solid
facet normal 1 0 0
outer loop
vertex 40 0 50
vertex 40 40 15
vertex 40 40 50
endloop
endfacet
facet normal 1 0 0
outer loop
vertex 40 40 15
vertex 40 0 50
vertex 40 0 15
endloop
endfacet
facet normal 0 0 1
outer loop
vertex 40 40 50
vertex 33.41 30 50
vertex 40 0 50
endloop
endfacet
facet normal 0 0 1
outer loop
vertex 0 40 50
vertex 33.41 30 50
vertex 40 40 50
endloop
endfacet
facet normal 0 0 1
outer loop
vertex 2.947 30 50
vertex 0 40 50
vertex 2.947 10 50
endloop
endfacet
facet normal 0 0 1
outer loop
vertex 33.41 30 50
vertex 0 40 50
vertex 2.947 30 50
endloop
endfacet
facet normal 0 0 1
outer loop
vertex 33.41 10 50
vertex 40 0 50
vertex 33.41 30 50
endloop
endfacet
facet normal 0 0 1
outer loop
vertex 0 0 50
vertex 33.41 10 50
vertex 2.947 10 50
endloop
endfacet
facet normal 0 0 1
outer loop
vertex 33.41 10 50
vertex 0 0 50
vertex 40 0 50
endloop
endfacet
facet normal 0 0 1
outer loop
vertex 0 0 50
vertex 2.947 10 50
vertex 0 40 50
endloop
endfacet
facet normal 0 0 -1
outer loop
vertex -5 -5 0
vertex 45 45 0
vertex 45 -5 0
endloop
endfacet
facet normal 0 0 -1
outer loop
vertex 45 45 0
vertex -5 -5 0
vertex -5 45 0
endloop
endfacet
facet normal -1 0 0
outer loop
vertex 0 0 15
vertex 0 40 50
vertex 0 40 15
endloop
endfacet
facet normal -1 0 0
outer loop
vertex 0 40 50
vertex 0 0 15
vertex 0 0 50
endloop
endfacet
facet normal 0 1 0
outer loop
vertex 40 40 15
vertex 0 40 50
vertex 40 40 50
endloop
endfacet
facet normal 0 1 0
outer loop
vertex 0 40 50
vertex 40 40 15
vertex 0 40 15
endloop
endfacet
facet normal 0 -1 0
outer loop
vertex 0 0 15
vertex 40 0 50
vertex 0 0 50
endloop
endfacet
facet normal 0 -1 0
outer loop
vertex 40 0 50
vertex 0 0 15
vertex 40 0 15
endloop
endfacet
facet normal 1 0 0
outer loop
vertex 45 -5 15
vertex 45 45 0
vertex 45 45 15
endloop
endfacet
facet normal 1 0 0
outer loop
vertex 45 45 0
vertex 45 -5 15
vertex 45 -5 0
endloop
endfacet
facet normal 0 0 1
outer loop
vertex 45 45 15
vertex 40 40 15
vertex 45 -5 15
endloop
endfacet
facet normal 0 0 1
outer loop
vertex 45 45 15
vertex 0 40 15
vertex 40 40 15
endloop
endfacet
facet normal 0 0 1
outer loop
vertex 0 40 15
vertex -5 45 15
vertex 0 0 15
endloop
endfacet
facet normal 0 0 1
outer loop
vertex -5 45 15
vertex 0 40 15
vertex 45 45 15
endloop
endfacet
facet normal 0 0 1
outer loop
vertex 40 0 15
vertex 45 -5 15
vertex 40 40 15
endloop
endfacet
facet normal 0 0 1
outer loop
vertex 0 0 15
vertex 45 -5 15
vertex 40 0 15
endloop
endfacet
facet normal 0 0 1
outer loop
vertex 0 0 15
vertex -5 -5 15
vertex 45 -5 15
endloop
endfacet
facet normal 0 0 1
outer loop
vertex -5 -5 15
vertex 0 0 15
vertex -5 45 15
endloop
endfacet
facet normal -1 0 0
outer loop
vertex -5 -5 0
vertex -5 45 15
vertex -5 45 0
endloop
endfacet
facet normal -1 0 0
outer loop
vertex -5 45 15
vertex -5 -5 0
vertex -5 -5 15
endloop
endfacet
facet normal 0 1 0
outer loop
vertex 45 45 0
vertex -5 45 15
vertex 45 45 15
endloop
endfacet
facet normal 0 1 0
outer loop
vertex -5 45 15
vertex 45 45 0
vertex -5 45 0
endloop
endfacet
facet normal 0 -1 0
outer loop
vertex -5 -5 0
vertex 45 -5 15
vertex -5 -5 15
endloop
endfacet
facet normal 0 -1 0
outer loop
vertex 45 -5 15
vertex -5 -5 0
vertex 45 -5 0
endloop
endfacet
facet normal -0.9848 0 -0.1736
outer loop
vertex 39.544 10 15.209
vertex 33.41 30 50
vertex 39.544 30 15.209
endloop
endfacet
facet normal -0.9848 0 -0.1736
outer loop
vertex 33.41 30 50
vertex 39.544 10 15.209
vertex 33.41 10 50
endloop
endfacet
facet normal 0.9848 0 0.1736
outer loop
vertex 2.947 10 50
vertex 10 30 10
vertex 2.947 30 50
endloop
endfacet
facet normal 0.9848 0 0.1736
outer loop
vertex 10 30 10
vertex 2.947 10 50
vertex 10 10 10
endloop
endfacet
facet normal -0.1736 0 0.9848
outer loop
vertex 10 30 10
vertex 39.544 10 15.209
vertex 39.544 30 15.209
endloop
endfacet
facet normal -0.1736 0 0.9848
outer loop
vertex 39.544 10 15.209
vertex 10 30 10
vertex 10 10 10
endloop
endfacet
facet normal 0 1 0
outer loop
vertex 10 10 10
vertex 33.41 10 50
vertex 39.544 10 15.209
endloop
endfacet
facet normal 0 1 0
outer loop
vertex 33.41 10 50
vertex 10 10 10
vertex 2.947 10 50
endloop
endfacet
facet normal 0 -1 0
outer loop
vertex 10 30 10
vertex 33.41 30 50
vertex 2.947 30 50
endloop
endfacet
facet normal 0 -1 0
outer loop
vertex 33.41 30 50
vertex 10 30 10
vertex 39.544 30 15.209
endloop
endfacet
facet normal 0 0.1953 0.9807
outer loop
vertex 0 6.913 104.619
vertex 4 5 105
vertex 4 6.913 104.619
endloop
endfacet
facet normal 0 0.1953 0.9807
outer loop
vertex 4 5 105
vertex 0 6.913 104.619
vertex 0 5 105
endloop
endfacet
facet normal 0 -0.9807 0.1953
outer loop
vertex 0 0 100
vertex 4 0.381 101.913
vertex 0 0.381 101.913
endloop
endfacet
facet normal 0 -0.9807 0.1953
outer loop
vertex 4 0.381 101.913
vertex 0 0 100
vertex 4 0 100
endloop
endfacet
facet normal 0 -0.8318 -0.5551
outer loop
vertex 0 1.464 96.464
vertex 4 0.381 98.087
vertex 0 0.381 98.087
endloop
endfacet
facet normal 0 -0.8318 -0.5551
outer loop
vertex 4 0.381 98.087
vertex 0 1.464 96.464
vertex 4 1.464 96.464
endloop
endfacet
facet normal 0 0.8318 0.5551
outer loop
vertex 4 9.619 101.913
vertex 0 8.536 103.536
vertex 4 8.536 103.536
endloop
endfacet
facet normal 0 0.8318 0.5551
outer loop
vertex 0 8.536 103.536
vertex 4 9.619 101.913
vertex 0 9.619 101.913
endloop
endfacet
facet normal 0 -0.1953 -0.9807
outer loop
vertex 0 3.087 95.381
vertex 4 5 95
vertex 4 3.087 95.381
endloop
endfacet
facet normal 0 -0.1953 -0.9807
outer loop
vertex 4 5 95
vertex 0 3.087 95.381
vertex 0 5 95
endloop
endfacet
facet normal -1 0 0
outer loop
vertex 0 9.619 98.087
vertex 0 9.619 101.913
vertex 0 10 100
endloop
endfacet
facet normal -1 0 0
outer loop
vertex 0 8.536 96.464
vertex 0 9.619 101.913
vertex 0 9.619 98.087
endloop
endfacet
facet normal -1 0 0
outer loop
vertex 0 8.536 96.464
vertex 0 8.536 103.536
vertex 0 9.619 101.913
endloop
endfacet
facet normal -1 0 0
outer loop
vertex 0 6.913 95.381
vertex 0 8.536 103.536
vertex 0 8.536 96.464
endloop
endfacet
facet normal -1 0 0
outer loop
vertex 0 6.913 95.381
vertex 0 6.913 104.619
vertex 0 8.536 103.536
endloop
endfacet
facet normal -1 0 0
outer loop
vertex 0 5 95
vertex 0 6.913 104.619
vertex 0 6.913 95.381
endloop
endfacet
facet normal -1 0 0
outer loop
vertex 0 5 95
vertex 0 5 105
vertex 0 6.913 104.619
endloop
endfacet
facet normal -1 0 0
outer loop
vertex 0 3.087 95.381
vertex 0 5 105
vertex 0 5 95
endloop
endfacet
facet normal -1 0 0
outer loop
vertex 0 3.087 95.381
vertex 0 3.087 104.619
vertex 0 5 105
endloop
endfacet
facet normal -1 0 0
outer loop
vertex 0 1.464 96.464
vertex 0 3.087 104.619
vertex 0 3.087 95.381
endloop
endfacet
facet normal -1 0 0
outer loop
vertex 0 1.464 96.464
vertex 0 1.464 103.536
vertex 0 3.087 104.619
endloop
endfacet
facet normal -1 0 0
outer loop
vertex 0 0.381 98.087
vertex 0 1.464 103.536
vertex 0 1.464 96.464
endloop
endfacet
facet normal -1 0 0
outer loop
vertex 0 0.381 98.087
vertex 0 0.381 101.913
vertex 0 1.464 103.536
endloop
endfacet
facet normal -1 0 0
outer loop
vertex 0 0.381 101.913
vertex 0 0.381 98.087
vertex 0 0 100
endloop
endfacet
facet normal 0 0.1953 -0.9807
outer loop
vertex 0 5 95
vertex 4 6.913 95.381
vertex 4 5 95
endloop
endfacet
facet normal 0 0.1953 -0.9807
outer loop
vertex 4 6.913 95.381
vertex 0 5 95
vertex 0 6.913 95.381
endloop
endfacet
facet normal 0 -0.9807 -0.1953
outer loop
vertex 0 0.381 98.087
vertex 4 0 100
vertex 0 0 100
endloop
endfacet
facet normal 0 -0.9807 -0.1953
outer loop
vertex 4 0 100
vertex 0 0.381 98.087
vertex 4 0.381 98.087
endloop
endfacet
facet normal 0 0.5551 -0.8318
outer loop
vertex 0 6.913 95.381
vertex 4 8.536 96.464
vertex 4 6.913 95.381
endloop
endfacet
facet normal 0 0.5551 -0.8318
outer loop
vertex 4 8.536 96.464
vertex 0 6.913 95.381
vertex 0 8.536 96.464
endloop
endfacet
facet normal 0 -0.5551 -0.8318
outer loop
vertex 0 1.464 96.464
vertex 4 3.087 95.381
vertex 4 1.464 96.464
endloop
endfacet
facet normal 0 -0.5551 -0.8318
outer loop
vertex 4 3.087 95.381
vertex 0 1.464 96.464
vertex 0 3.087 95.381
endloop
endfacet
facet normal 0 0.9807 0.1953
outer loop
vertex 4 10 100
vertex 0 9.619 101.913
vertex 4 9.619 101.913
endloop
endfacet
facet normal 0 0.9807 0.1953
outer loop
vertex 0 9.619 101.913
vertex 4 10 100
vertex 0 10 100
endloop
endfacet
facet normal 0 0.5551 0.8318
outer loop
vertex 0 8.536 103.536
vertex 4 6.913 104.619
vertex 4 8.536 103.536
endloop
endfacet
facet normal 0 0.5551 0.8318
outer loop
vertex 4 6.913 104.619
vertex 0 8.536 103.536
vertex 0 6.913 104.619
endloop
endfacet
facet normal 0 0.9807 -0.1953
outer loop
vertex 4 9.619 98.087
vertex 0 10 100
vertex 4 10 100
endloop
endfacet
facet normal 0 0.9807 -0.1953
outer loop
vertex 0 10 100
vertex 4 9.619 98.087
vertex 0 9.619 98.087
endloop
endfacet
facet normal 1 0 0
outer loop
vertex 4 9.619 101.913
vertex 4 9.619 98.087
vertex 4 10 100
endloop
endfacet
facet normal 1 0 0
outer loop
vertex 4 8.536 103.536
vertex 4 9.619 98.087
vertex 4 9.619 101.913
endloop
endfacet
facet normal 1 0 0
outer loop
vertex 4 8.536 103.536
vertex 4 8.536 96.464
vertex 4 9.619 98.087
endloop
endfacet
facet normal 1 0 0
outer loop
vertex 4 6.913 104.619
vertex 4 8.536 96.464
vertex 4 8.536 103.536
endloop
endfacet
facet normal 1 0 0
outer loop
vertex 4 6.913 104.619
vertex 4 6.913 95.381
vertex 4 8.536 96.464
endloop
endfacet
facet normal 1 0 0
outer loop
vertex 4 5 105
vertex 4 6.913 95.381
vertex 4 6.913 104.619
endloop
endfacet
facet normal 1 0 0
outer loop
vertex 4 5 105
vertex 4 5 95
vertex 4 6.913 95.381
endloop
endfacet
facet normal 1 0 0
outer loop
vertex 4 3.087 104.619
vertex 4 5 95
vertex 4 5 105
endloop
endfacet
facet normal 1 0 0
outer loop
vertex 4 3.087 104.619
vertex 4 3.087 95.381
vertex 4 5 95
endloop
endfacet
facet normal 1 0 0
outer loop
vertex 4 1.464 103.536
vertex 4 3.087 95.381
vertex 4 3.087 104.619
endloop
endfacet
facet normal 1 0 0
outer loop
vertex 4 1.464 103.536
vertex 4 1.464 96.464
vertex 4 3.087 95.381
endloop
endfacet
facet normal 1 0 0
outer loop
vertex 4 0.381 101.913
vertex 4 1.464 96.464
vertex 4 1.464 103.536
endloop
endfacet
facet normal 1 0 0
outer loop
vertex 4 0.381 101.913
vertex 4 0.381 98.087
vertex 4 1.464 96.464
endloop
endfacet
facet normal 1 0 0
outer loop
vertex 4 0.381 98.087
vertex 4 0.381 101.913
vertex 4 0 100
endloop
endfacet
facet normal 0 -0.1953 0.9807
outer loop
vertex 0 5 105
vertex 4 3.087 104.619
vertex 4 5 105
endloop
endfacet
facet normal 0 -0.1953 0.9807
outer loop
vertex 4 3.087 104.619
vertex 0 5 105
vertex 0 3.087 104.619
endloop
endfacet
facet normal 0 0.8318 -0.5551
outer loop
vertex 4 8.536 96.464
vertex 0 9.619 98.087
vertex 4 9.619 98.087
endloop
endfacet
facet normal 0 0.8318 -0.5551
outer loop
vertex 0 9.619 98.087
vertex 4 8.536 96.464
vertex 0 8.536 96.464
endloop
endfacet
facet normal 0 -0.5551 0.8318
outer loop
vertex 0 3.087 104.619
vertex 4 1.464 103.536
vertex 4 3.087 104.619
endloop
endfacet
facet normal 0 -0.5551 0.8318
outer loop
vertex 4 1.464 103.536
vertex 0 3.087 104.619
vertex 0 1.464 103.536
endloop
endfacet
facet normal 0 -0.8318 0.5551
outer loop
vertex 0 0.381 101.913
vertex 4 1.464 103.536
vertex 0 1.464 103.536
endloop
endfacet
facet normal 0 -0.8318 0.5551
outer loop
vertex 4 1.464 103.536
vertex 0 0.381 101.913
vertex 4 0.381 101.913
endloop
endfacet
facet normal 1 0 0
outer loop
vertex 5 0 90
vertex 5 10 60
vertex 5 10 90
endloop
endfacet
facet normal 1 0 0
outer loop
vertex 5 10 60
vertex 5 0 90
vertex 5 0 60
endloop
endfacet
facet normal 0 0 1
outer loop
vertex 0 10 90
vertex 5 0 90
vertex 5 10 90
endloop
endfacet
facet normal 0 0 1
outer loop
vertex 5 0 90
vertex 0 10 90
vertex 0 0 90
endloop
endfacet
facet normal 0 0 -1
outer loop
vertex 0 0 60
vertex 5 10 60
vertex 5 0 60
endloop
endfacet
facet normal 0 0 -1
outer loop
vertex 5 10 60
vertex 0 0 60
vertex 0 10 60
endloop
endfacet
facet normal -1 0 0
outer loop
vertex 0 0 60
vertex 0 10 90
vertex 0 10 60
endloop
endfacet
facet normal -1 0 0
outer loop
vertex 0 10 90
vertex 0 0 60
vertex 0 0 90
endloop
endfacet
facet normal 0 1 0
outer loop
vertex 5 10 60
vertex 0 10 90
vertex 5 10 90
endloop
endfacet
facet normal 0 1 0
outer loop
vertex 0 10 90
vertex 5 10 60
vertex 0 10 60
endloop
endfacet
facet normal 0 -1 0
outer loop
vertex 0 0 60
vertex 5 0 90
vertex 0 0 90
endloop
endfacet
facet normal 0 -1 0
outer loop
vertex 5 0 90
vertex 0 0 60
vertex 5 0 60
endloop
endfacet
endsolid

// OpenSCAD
// Weird leg notes
// width 44
// height 33.5

// can import PNG with surface
// surface(file=logo,invert=true); 

module leg() {
    rotate([0, -10, 0])
    cube([30, 20, 450]);
}

module foot() {
    difference() {
        union() {
          cube([40, 40, 50]);
          translate([-5, -5, 0])
          cube([50, 50, 15]);
        }
        translate([10, 10, 10])
        leg();
    }
}


// want a bolt hole??
module hip() {
    difference() {
        cube([40, 40, 50]);
        
        translate([10, 10, 10])
        leg();
    }
}


// translate([0, 100, 0])
// leg();

translate([0, 5, 100])
rotate([0, 90, 0])
cylinder(h=4, r=5);

translate([0, 0, 60])
cube([5, 10, 30]);

//translate([0, 50, 0])
foot();


// hip();



/*
translate([-25,-55,0]) { 
  difference() {
    // cube outter
    cube([52,112,93]);
    // subtraction shape
    translate([1,1,3])
      union() {
      }
  }
}

*/

/*

difference() {

  cube([20, 110, 29]);

  translate([-1, 32.5, -1])
  cube([60, 45, 20]);
}



// picture board is about 12.3mm thick
// TODO: add picture holders

translate([0, 82, 29])
union() {

  cube([20, 7, 12]);

  translate([0, 21, 0])
  cube([20, 7, 12]);
    
}

*/
